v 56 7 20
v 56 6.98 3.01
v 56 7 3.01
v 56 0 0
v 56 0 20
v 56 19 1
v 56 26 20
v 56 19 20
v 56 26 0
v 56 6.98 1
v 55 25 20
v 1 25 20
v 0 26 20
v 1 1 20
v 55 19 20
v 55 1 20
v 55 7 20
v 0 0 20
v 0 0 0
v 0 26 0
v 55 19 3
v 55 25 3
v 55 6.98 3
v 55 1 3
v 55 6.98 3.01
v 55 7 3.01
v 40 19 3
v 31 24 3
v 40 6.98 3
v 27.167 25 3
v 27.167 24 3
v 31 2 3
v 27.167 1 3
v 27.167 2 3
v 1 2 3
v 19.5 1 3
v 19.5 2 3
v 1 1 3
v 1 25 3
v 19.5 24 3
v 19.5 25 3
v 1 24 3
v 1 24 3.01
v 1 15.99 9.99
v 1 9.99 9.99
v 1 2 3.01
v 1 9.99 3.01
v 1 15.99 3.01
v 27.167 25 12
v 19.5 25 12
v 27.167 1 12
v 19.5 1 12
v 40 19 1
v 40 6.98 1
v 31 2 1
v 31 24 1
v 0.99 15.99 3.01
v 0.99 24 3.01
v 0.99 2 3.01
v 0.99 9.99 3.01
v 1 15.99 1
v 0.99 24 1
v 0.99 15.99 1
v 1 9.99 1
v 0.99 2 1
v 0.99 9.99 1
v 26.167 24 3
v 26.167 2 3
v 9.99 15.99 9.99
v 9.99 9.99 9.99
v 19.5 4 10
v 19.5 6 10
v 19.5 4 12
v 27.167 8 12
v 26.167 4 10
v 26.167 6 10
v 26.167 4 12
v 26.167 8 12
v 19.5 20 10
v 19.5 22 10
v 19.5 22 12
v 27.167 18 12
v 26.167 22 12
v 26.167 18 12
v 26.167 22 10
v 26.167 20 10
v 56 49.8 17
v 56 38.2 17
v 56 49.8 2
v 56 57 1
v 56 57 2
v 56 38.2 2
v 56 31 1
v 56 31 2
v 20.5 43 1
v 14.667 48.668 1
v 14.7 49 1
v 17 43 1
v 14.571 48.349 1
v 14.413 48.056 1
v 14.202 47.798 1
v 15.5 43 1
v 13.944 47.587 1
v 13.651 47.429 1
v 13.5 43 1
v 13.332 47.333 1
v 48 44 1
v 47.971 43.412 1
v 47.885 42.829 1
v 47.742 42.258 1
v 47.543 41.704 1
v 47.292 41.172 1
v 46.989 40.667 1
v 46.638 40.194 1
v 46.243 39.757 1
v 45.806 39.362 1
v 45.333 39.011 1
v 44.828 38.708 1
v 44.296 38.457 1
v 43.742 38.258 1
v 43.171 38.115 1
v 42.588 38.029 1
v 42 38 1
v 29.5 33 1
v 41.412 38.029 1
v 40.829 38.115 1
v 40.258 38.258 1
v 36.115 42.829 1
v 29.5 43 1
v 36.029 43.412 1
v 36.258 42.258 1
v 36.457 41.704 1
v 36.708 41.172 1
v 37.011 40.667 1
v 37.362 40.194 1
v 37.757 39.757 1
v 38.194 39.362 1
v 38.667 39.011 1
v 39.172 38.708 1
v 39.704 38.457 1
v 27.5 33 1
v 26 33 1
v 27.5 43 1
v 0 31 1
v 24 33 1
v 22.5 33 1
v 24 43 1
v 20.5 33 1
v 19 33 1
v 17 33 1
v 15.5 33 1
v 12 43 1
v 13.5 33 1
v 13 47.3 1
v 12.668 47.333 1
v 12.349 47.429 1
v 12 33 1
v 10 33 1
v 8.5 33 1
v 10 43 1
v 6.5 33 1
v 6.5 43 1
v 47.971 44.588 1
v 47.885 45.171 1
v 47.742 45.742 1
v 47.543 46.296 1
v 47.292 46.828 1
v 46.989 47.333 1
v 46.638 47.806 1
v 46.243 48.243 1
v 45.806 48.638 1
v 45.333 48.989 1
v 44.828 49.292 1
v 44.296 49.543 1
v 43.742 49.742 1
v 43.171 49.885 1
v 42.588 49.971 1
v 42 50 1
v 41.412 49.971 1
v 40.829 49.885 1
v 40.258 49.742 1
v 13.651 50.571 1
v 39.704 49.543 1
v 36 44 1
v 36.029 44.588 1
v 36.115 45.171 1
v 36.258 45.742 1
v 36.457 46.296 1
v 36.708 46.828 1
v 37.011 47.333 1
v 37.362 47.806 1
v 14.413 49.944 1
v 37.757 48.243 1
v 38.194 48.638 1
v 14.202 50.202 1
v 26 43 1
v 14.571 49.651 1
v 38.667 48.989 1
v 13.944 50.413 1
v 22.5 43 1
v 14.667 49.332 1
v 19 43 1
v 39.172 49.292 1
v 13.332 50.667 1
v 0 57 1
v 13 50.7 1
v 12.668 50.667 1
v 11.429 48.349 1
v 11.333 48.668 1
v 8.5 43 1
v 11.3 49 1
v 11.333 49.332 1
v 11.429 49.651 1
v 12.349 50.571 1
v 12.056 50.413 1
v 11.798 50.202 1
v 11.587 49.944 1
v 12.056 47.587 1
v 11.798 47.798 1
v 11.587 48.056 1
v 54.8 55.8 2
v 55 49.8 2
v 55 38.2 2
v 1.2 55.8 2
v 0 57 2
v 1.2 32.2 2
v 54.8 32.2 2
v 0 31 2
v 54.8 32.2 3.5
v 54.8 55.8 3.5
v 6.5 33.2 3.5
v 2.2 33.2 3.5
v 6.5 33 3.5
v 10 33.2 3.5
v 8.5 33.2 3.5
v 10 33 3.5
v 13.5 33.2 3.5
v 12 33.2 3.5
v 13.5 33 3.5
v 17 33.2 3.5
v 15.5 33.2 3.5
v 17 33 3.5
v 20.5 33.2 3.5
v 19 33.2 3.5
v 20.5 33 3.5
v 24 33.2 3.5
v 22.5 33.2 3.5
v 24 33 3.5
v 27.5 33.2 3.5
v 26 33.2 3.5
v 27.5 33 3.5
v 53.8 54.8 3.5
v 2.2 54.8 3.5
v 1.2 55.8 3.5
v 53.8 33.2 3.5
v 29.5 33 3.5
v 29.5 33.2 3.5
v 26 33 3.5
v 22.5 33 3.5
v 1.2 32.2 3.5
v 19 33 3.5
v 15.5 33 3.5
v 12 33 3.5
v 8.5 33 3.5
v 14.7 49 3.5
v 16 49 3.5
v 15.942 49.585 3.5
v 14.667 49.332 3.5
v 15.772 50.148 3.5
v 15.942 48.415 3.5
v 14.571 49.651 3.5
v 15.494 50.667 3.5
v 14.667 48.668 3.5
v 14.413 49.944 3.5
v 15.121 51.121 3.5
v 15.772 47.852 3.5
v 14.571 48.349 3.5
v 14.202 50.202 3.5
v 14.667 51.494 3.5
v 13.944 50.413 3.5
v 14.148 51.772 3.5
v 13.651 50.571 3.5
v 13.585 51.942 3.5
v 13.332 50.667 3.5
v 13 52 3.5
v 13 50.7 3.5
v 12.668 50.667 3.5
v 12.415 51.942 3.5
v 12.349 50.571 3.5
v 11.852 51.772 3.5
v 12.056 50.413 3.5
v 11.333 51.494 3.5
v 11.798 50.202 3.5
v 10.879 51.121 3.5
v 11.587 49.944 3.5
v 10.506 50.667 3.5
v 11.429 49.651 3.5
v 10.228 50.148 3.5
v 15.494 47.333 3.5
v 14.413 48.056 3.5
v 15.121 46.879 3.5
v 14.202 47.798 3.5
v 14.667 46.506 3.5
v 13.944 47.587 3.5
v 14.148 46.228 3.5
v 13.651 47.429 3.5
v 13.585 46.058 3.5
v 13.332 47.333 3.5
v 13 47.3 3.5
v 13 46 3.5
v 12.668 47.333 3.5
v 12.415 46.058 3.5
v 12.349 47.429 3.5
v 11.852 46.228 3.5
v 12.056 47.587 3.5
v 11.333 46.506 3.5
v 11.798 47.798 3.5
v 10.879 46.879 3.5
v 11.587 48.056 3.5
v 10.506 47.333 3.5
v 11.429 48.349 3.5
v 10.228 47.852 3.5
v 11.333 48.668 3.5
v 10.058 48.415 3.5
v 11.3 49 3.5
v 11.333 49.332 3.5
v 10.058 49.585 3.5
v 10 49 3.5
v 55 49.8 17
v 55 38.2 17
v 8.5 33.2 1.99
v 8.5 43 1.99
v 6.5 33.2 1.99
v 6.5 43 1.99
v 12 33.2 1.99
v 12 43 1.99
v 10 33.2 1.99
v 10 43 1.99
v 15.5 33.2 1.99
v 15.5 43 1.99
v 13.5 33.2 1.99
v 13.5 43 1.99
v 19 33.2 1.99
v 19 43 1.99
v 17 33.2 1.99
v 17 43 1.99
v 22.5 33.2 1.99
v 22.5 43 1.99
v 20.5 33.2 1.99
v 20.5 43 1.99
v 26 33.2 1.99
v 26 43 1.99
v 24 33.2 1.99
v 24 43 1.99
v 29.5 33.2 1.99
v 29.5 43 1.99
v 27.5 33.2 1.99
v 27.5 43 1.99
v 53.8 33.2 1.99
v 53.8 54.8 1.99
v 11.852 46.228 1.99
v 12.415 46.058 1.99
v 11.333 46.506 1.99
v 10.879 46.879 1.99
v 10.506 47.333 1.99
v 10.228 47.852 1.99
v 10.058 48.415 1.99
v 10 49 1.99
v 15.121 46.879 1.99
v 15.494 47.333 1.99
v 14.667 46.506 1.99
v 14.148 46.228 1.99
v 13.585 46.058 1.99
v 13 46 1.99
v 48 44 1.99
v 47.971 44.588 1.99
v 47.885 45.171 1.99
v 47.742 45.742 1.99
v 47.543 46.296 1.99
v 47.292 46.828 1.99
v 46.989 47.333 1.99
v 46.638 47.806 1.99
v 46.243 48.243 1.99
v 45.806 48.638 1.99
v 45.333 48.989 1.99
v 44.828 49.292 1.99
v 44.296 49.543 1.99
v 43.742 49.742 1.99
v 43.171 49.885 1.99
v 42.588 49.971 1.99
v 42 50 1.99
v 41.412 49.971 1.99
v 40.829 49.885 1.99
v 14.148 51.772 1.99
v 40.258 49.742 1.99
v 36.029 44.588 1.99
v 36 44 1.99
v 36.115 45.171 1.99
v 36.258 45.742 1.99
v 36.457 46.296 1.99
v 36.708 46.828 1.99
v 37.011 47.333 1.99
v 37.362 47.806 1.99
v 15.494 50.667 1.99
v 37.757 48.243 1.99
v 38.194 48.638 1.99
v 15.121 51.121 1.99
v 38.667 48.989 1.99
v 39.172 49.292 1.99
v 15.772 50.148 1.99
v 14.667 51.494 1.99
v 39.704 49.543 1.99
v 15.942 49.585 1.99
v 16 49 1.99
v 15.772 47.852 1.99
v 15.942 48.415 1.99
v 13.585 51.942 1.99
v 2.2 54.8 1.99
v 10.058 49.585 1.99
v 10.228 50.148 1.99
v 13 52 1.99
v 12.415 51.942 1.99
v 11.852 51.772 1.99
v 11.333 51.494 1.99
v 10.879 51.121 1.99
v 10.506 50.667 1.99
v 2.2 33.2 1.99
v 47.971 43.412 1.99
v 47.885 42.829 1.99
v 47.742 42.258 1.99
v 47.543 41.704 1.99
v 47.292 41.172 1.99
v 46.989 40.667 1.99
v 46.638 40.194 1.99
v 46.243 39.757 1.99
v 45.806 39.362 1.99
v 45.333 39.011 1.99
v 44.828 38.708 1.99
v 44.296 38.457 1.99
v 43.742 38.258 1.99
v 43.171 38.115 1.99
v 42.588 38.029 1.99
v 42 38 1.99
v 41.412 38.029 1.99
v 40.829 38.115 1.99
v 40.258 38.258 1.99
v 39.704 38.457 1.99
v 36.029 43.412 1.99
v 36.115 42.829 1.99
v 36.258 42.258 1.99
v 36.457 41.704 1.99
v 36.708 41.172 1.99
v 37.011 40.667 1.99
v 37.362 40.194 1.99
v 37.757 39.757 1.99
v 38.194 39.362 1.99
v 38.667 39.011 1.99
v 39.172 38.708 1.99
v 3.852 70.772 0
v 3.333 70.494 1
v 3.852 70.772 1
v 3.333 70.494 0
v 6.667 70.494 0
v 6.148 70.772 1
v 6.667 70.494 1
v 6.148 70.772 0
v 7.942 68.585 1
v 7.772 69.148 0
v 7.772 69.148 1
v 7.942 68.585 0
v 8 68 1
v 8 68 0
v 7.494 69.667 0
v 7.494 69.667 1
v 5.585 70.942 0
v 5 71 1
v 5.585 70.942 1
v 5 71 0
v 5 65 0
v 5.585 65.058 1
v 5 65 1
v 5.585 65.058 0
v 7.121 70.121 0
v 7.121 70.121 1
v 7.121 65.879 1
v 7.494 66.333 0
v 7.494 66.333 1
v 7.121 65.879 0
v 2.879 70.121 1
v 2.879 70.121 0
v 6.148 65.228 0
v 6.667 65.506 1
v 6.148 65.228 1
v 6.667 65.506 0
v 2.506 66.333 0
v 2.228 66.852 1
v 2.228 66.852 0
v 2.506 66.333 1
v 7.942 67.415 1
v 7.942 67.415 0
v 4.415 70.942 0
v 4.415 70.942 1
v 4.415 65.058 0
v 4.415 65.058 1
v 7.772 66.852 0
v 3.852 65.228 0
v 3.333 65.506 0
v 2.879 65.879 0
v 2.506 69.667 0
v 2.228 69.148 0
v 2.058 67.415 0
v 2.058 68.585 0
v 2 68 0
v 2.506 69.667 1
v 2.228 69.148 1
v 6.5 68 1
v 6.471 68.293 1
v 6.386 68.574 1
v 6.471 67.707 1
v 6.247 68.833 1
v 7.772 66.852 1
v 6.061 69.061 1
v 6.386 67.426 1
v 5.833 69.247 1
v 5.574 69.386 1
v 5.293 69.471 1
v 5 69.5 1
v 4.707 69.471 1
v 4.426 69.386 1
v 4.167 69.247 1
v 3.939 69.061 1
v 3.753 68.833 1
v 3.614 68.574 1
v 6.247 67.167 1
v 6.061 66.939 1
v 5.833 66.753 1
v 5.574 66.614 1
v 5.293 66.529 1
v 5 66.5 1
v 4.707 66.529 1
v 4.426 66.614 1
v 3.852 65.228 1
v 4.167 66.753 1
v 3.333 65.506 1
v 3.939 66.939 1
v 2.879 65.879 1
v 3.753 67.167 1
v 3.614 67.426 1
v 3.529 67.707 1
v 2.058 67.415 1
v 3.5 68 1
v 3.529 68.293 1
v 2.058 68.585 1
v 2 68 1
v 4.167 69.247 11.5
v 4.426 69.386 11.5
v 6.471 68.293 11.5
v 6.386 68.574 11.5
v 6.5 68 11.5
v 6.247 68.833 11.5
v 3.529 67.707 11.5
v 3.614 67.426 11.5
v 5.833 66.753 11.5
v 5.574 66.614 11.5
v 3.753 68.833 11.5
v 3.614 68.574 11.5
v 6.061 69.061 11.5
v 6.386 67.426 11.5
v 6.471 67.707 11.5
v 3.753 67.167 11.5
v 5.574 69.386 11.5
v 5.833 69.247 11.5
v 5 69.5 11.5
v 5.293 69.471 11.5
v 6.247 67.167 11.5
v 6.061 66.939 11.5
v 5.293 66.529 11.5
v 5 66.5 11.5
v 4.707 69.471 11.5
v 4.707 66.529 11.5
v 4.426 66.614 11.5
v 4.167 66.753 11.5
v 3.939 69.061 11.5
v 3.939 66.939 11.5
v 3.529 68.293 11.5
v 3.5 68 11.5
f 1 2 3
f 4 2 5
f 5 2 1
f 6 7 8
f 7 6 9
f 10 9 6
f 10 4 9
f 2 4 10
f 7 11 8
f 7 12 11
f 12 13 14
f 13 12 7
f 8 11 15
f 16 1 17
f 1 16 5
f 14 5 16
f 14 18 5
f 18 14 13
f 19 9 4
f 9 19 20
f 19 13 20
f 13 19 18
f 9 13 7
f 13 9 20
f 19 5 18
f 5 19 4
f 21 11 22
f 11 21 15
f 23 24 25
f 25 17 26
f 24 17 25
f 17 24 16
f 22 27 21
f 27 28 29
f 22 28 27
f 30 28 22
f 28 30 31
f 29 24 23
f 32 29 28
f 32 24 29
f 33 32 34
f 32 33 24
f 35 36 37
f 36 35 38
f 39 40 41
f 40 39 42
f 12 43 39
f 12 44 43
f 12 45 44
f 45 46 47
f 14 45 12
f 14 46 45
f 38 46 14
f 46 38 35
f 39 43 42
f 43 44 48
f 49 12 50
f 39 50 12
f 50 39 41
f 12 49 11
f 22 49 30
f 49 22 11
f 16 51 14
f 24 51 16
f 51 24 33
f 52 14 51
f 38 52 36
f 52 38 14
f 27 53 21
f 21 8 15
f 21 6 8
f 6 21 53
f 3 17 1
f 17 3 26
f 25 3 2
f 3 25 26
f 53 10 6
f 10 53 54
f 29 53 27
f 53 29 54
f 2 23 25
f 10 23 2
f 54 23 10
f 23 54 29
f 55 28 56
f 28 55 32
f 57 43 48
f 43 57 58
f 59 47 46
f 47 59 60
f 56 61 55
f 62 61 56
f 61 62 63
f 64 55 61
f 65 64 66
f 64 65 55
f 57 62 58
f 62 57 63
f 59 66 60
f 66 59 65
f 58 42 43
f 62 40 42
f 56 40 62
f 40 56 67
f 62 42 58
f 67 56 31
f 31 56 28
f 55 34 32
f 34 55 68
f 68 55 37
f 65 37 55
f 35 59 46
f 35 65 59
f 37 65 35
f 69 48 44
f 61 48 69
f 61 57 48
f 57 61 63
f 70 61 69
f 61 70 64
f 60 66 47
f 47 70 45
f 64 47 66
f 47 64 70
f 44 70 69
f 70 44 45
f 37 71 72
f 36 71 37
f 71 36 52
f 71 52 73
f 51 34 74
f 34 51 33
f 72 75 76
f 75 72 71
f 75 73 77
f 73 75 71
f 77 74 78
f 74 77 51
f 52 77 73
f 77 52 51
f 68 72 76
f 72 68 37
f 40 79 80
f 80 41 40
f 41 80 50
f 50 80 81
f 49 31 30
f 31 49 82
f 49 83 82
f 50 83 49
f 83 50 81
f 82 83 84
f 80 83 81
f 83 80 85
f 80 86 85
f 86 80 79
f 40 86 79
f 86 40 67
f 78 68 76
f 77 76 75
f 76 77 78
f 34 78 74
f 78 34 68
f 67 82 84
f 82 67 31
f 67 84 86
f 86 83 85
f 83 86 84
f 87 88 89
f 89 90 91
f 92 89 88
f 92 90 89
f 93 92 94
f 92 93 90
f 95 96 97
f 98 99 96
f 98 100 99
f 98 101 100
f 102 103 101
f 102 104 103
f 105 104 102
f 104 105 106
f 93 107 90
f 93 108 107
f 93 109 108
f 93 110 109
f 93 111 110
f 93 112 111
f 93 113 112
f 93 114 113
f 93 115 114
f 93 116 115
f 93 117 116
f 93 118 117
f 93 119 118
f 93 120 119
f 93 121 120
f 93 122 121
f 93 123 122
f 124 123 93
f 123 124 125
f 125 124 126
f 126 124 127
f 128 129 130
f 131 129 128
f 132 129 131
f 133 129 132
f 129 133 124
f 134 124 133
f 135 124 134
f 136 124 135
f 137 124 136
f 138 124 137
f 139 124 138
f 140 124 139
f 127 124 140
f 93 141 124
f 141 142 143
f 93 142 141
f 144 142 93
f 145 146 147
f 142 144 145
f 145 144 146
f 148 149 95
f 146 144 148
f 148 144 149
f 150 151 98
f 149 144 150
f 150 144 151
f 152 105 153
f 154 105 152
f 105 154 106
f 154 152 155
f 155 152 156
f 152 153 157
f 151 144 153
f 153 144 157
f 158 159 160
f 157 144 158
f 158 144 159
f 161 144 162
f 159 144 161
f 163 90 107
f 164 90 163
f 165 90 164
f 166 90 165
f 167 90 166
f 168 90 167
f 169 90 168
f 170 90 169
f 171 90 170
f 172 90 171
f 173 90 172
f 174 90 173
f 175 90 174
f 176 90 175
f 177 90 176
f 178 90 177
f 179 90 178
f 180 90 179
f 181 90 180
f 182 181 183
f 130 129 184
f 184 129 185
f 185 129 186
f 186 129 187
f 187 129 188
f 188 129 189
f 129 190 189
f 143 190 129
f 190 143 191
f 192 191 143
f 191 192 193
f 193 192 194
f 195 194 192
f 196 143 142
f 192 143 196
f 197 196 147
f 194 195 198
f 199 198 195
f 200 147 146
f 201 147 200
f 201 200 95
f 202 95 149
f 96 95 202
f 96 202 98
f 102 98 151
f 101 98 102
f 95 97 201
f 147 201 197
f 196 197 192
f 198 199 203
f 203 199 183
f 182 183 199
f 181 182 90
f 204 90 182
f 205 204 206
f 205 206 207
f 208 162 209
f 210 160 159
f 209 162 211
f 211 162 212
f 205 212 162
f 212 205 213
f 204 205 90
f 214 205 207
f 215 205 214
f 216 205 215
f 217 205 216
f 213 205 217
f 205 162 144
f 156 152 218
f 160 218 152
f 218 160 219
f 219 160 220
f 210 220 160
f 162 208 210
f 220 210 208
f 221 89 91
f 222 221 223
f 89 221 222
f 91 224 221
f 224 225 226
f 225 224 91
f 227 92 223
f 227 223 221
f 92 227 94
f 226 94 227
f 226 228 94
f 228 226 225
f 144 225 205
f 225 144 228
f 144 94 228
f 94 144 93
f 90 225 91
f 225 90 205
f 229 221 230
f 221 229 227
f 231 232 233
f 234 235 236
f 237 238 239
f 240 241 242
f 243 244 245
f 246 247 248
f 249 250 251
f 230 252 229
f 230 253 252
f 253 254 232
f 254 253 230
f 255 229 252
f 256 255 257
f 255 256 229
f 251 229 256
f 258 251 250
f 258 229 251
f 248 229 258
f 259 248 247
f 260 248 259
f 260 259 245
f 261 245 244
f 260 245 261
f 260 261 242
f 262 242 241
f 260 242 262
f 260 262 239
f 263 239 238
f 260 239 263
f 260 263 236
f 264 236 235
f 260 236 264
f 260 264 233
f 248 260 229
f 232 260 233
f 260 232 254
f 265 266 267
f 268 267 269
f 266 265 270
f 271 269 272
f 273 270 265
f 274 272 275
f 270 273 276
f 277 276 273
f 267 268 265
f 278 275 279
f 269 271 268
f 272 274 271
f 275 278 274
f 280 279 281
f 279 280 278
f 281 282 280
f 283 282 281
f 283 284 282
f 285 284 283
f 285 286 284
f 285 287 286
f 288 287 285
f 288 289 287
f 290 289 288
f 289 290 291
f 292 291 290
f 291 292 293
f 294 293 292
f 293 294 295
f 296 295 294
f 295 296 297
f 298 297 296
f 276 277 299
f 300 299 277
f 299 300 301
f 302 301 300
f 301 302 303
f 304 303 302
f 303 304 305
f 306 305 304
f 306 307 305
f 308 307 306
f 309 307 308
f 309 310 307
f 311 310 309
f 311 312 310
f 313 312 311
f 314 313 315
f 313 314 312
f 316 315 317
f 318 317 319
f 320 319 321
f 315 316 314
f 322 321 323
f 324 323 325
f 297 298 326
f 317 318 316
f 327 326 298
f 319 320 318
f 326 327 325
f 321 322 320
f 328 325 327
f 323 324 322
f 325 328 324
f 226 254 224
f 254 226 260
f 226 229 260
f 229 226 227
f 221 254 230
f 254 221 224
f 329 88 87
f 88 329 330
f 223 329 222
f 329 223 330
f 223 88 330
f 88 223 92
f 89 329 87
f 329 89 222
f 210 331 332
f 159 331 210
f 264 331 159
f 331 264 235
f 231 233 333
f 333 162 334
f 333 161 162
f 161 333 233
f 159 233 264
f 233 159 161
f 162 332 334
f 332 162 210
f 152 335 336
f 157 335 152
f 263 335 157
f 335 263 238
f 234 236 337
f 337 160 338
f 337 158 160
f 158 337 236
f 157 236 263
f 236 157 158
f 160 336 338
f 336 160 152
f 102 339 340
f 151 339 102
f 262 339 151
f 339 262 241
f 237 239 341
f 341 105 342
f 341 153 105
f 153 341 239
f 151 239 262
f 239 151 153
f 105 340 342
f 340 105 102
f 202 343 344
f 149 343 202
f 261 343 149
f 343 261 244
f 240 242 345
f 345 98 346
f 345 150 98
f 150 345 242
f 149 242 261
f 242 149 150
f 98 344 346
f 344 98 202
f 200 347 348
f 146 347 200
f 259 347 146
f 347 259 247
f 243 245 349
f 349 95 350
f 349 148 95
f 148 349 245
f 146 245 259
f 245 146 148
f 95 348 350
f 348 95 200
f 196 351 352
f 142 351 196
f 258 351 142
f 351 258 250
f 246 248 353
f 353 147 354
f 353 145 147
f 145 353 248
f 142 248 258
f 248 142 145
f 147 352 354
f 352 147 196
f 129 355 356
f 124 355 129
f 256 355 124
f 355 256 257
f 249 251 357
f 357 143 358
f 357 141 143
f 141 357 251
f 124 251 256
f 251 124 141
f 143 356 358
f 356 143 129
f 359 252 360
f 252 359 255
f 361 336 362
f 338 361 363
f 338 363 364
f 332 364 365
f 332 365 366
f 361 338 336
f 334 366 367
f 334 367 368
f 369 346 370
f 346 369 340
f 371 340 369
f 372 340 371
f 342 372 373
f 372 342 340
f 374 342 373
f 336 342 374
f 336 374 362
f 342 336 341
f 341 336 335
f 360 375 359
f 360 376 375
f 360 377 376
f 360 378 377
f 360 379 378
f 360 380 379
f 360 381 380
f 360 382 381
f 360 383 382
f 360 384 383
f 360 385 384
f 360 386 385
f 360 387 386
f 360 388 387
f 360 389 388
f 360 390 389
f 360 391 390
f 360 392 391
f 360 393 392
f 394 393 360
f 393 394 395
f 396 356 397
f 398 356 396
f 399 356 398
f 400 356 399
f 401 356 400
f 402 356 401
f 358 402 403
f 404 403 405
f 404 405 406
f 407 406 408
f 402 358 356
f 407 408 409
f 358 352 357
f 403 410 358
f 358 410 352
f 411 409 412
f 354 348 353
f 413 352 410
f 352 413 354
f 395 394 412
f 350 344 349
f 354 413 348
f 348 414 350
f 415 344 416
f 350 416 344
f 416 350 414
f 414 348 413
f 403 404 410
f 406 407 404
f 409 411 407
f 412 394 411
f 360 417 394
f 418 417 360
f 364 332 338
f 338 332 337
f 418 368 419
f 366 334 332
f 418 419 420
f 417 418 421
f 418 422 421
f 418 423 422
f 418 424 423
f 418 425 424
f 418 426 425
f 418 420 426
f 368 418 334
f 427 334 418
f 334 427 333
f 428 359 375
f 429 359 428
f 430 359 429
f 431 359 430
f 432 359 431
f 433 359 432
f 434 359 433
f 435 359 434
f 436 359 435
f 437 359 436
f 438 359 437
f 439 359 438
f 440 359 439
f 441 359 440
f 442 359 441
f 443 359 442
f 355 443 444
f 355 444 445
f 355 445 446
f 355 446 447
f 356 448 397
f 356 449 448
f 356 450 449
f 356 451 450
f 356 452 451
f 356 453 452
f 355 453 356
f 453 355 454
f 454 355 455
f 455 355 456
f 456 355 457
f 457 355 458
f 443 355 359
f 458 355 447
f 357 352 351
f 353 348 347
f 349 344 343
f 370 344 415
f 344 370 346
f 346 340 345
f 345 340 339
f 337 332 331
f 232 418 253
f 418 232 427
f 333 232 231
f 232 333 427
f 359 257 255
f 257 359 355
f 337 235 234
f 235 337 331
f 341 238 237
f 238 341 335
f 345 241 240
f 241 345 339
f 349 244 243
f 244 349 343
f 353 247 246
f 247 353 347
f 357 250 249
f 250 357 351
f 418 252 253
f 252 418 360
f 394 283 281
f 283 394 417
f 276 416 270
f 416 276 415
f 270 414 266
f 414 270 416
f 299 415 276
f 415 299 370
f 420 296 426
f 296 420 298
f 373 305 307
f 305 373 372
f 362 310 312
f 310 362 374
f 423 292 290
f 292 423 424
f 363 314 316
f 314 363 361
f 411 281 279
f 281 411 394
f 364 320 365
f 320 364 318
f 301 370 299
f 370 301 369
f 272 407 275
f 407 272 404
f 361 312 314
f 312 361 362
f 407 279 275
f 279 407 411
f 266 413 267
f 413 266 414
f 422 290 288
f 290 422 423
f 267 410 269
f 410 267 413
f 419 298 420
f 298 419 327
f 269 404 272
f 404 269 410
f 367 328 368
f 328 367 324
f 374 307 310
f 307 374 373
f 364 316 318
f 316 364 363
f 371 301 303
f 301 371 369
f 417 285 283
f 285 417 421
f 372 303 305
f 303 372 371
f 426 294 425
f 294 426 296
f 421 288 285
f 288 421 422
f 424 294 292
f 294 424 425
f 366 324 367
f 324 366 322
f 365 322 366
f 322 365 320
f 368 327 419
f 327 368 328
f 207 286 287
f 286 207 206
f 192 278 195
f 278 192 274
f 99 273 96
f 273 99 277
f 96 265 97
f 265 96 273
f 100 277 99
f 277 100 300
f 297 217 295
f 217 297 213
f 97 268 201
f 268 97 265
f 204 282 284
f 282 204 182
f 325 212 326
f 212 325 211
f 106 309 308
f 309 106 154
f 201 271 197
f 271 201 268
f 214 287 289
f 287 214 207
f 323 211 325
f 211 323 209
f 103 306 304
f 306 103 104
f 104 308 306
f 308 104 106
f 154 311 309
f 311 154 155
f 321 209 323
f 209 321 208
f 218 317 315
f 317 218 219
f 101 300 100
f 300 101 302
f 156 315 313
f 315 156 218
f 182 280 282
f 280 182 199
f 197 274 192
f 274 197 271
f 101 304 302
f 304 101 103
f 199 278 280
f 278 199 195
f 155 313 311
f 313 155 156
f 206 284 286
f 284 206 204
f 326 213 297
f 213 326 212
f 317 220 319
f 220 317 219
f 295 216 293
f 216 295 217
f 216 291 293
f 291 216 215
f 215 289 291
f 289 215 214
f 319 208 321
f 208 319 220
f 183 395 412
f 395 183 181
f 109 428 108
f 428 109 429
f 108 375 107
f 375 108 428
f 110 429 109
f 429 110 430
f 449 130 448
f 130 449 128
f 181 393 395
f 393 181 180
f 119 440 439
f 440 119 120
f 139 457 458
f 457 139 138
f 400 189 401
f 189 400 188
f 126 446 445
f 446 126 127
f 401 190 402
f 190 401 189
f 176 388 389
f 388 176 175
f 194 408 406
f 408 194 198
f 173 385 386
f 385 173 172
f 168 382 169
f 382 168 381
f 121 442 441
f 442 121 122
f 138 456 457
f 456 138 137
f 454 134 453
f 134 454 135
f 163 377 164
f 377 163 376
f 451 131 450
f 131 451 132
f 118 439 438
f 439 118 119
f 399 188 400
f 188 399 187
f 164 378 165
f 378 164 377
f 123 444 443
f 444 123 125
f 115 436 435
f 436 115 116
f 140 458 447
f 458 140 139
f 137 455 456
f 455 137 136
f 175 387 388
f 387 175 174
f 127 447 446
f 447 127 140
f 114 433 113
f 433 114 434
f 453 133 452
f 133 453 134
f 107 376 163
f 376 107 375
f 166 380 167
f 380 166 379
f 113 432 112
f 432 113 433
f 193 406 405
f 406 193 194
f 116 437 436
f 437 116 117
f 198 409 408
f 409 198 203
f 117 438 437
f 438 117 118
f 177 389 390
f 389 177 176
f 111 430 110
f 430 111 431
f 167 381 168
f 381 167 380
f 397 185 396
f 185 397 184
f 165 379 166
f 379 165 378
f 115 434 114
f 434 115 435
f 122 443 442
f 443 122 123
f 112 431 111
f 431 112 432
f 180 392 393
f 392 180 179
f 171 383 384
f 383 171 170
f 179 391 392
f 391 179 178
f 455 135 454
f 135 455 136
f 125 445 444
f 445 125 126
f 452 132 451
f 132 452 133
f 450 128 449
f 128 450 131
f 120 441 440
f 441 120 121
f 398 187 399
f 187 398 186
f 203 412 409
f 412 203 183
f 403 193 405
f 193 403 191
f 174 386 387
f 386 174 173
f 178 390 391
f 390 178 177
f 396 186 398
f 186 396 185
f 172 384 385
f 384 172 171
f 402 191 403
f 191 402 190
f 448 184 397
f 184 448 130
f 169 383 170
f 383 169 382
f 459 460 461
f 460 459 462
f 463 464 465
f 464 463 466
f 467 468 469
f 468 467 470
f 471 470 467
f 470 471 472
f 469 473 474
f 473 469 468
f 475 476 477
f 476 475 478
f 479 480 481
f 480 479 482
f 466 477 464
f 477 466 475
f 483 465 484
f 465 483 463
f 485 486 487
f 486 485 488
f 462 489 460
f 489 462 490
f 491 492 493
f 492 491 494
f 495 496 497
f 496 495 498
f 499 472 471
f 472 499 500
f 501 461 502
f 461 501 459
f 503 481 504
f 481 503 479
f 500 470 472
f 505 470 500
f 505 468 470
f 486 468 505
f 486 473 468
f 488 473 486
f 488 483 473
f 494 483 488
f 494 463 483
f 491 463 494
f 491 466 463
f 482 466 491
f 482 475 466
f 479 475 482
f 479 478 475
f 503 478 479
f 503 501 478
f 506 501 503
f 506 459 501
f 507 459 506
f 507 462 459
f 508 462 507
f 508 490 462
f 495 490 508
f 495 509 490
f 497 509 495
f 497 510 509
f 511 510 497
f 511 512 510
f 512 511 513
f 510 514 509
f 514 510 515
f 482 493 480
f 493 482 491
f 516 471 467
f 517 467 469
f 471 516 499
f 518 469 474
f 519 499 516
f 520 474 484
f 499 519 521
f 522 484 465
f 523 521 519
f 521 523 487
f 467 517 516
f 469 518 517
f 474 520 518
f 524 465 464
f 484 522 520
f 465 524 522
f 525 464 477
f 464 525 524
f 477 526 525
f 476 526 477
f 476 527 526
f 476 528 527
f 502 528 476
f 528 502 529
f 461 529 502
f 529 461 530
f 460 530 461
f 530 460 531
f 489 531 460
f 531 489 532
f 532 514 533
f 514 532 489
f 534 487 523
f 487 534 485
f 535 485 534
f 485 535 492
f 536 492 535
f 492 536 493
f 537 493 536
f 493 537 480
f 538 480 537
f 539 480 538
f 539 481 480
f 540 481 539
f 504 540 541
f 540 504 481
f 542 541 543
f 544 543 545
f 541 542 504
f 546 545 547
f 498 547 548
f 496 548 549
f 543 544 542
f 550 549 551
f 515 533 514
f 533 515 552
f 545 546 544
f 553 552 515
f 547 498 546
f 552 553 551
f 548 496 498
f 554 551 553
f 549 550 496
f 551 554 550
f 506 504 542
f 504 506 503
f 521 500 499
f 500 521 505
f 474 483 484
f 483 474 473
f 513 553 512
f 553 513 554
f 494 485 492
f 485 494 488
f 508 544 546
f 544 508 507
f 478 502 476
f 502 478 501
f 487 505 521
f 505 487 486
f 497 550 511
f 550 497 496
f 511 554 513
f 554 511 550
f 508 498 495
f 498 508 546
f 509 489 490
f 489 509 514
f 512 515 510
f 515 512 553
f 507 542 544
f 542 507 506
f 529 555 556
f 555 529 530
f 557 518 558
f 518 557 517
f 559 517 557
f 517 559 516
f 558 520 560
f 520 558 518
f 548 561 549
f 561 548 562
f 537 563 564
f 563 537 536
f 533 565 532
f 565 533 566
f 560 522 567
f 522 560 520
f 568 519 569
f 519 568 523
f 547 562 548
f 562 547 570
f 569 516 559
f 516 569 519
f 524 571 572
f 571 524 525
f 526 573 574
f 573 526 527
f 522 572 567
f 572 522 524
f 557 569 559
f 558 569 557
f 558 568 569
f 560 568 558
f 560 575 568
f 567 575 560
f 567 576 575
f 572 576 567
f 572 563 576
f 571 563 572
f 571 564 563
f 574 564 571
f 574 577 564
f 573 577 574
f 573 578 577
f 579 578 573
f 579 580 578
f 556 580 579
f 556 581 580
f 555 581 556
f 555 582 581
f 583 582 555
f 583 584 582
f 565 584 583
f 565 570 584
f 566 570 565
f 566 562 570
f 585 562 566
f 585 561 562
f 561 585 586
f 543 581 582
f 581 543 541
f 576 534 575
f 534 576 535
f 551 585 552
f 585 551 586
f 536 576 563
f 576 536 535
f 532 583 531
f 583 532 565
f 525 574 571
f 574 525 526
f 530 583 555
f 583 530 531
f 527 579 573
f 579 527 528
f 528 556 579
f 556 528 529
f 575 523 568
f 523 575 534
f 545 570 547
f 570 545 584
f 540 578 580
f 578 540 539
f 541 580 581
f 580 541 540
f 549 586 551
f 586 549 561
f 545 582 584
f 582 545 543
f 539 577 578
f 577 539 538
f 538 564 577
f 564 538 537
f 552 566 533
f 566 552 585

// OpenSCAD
// Basic parametric box enclosure
// Units are millimeters (OpenSCAD convention)

// --- Parameters ---
esp_long_axis = 23;
esp_short_axis = 18;
wall    = 1;    // wall thickness
usb_body_len    = 21;  // how far the connector body extends inward from the +X wall

outer_x = esp_short_axis + 2*wall + usb_body_len + 15;
outer_y = esp_short_axis + 2*wall + 6;
outer_z = 20;   // box height
floor_thickness = 3;  // thicker than wall so the USB recess doesn't punch through
lid_gap = 0.2;  // clearance between box and lid (per side)

// USB cutout (on the +X wall, centered on Y)
usb_w = 12;     // aperture width
usb_h = 2;      // aperture height
usb_z = floor_thickness;  // slot bottom sits flush with inner floor surface

// USB connector body recess in the floor (pocket the connector body drops into)
usb_body_recess = 2;   // pocket depth (must be < floor_thickness or it punches through)

// Battery floor recess (opposite side from USB, below the esp holder)
battery_x = 30;        // length along X
battery_y = 22;        // width along Y
battery_recess = 2;    // pocket depth (must be < floor_thickness)


esp_pcb_raise       = 7;   // how far above the floor the PCB sits (= shelf height)

// Lid lip — perimeter frame nests inside the box walls; middle is hollow
// to save material and add interior headroom.
lip_h       = 1.5;
lip_frame_w = 1;   // width of the perimeter frame

// Button plunger — captive in the lid, presses the PCB's on-board button.
// Plunger is printed separately and drops into the lid hole from inside
// before the lid is assembled. The flange is wider than the hole, so it
// stays captive even when the box is held upside down.
button_x              = wall + 2 + 10;  // 10mm in X from the PCB origin
button_y              = wall + 3 + 4;   //  4mm in Y from the PCB origin
button_top_z          = 12;             // height of the real button's top above the box floor
plunger_shaft_d       = 3;
plunger_flange_d      = 6;
plunger_flange_h      = 1;
plunger_top_above_lid = 8;              // shaft pokes this far above the lid for finger-press
plunger_hole_d        = plunger_shaft_d + 0.4;  // shaft + clearance
plunger_pad_d         = plunger_flange_d + .0;   // lip pad around the hole that keeps the flange seated

// Center hole — through the lid in the -Y half (opposite the gills).
lid_hole_d = 12;
lid_hole_x = 3 * outer_x / 4;
lid_hole_y = outer_y / 2;

// Gills — vertical slots in the +Y half of the lid (opposite the plunger),
// cut through the lid plate and the lip so the on-board LED shines through.
gill_count = 7;
gill_w     = 2;                                                // slot width along X
gill_pitch = 3.5;                                                // X spacing between slot centers
gill_y_lo  = outer_y / 2 + 1 ;                                  // start past the lid Y midline
gill_y_hi  = outer_y - wall - 1;                               // end just inside the +Y wall
gill_x_lo  = (outer_x - ((gill_count - 1) * gill_pitch + gill_w)) / 2 - 10;

// Visibility toggles — flip to false to hide a component in preview
show_box         = true;
show_esp_holder  = true;
show_lid         = true;
show_assembled = false;  // when true, lid is offset for preview
show_pcbs = false;

// --- Box (open-top) ---
module box() {
    difference() {
        cube([outer_x, outer_y, outer_z]);
        // hollow interior, floor is `floor_thickness` thick
        translate([wall, wall, floor_thickness])
            cube([outer_x - 2*wall,
                  outer_y - 2*wall,
                  outer_z]); // cut all the way through the top

        // USB cutout through the +X wall, open all the way to the top of the box
        // (top of the aperture is closed by a tab on the lid)
        translate([outer_x - wall - 0.01,
                   (outer_y - usb_w) / 2,
                   usb_z])
            cube([wall + 0.02, usb_w, outer_z - usb_z + 0.01]);

        // Floor recess (pocket) for the USB connector body
        // Goes from the inner floor surface down by usb_body_recess
        translate([outer_x - usb_body_len + 5, // +5 => offset the X dimension to create a small division between batter pocket and USB pocket
                   (outer_y - usb_w) / 2 - 0.02,
                   floor_thickness - usb_body_recess])
            cube([usb_body_len + 0.02, usb_w + 0.02, usb_body_recess + 0.01]);

        // Battery floor recess on the -X side, centered on Y
        translate([wall - 0.01,
                   (outer_y - battery_y) / 2,
                   floor_thickness - battery_recess])
            cube([battery_x + 0.01, battery_y, battery_recess + 0.01]);
    }
}

// --- Lid (sits on top, with a lip that drops into the box) ---
module lid() {
    lip_x = outer_x - 2*wall - 2*lid_gap;
    lip_y = outer_y - 2*wall - 2*lid_gap;

    // height of the USB tab — fills the open part of the box's USB slot,
    // so the tab's underside becomes the top of the USB aperture
    usb_tab_h = outer_z - (usb_z + usb_h);

    difference() {
        union() {
            // flat top plate
            //%color([.8,.8,.2,.2])
            cube([outer_x, outer_y, wall]);
            // lip underneath that nests inside the box walls
            //%color([.8,.8,.2,.2])
            translate([wall + lid_gap, wall + lid_gap, -lip_h])
                cube([lip_x, lip_y, lip_h]);
            // USB tab — drops into the open-top slot in the +X wall
            translate([outer_x - wall,
                       (outer_y - usb_w) / 2 + lid_gap,
                       -usb_tab_h])
                cube([wall, usb_w - 2*lid_gap, usb_tab_h]);
        }
        // Plunger hole (through the lid plate and the lip below it)
        translate([button_x, button_y, -lip_h - 0.01])
            cylinder(d=plunger_hole_d, h=wall + lip_h + 0.02, $fn=32);

        // Center hole through the -Y half of the lid (opposite the gills)
        translate([lid_hole_x, lid_hole_y, -lip_h - 0.01])
            cylinder(d=lid_hole_d, h=wall + lip_h + 0.02, $fn=64);

        // Gills — let the on-board LED shine through the +Y half of the lid
        for (i = [0 : gill_count - 1])
            translate([gill_x_lo + i * gill_pitch, gill_y_lo, -lip_h - 0.01])
                cube([gill_w, gill_y_hi - gill_y_lo, wall + lip_h + 0.02]);

        // Hollow out the middle of the lip — keep a perimeter frame plus
        // a pad around the plunger hole so the flange still seats on lip.
        difference() {
            translate([wall + lid_gap + lip_frame_w,
                       wall + lid_gap + lip_frame_w,
                       -lip_h - 0.01])
                cube([lip_x - 2*lip_frame_w,
                      lip_y - 2*lip_frame_w,
                      lip_h + 0.02]);
            translate([button_x, button_y, -lip_h - 0.02])
                cylinder(d=plunger_pad_d, h=lip_h + 0.04, $fn=32);
        }
    }
}

// --- Plunger (separate part, captive in the lid hole) ---
module plunger() {
    $fn = 32;
    // Flange sits inside the box, under the lid lip — wider than the hole
    // so the plunger can't fall out when the device is inverted.
    cylinder(d=plunger_flange_d, h=plunger_flange_h);
    // Shaft runs from the flange up through the lip, the plate, and
    // pokes out the top by `plunger_top_above_lid` for finger-pressing.
    cylinder(d=plunger_shaft_d,
             h=plunger_flange_h + lip_h + wall + plunger_top_above_lid);
}

// -- Build a smaller holder for the ESP, with some room for connections below
module esp_holder() {
    support_l       = 6;
    tower_above_pcb = 2;   // tower extends this far above the shelf, alongside the PCB

    // Support wedge — knife edge at the floor (leaves the battery recess
    // clear), widens up to the PCB. Slope is 45° from the wall, which is
    // the steepest overhang most printers handle without supports.
    sup_z_bot = floor_thickness - battery_recess;
    sup_z_top = floor_thickness + esp_pcb_raise;
    support_w = sup_z_top - sup_z_bot;  // 45° overhang cap

    // -.01 to force wedge to merge with the box
    translate([0 - .01,
               wall + 3 + esp_short_axis/2 + support_l/2 -.01,
               0 - .01])
    rotate([90, 0, 0])
    linear_extrude(support_l)
        polygon([
            [wall,              sup_z_bot],
            [wall,              sup_z_top],
            [wall + support_w,  sup_z_top]
        ]);


    // Side retainers on the long edges of the PCB (Y sides).
    // Each is an L sitting on the floor: wide base on the floor strip
    // outside the battery recess, 45° ramp up to a shelf at PCB level
    // (PCB drops onto the shelf — vertical support), then a tower
    // alongside the PCB above the shelf (lateral support).
    z_bot       = floor_thickness;
    z_shelf     = z_bot + esp_pcb_raise;                // PCB rests on top of the shelf
    z_top       = z_shelf + tower_above_pcb;        // top of the tower
    base_y_in   = (outer_y - battery_y) / 2;        // battery recess edge (where the base ends)
    stopper_y_adj = 3;  // This adjusts how much the stopper and retainer project from the walls. A bigger adjustment means less projection and gentler slope => battery has more space
    slope_y_top = base_y_in + esp_pcb_raise-stopper_y_adj;            // 45° ramp rises esp_pcb_raise in y too
    pcb_y_edge  = wall + 3;                          // tower's inner edge (PCB's -Y edge)
    retainer_x   = wall + 7 + esp_long_axis/2;
    retainer_len = esp_long_axis/3;

    // -Y retainer
    translate([retainer_x, 0, 0])
    rotate([90, 0, 90])
    linear_extrude(retainer_len)
        polygon([
            [wall,        z_bot],         // base outer (at wall)
            [base_y_in,   z_bot],         // base inner (battery recess edge)
            [slope_y_top, z_shelf],       // top of 45° ramp = outer edge of shelf
            [pcb_y_edge,  z_shelf],       // shelf inner = tower outer (PCB rests here)
            [pcb_y_edge,  z_top],         // top of tower (PCB side)
            [wall,        z_top]          // top of tower (wall side)
        ]);

    // +Y retainer (mirror)
    translate([retainer_x, 0, 0])
    rotate([90, 0, 90])
    linear_extrude(retainer_len)
        polygon([
            [outer_y - wall,        z_bot],
            [outer_y - base_y_in,   z_bot],
            [outer_y - slope_y_top, z_shelf],
            [outer_y - pcb_y_edge,  z_shelf],
            [outer_y - pcb_y_edge,  z_top],
            [outer_y - wall,        z_top]
        ]);

    // X-stopper at the +X end of each retainer: replace the L's last
    // `stopper_len` with a solid wedge (45° ramp continues all the way
    // to z_top, no shelf notch). The wedge intrudes into the PCB area
    // above the shelf, so the PCB butts up against it and can't slide
    // along X.
    stopper_len  = 1;
    stopper_apex = base_y_in + (z_top - z_bot)-stopper_y_adj;   // 45° ramp's y at z_top

    // -Y stopper
    translate([retainer_x + retainer_len - stopper_len, 0, 0])
    rotate([90, 0, 90])
    linear_extrude(stopper_len)
        polygon([
            [wall,         z_bot],
            [base_y_in,    z_bot],
            [stopper_apex, z_top],
            [wall,         z_top]
        ]);

    // +Y stopper (mirror)
    translate([retainer_x + retainer_len - stopper_len, 0, 0])
    rotate([90, 0, 90])
    linear_extrude(stopper_len)
        polygon([
            [outer_y - wall,         z_bot],
            [outer_y - base_y_in,    z_bot],
            [outer_y - stopper_apex, z_top],
            [outer_y - wall,         z_top]
        ]);
}

module pcbs() {
    // ESP PCB (representation), raised by the support
    %color([.0,.6,.8,.3])
    %translate([wall+2, wall+3, floor_thickness + esp_pcb_raise])
        cube([esp_long_axis, esp_short_axis, 5]);

    // Battery (representation) — 19×26×4mm, rotated so the 26mm side
    // runs along X to fit the 30×20 floor recess. Bottom sits in the
    // recess; the 4mm battery sticks up 2mm past the floor surface.
    %color([.7,.5,.1,.3])
    %translate([wall + 2, (outer_y - 19)/2, floor_thickness - battery_recess])
        cube([26, 19, 4]);

    // USB PCB (representation) — 30×12×3mm. Sits in the floor recess
    // channel that cuts through the +X wall; the +X end protrudes 5mm
    // past the box for the connector to plug into.
    %color([.2,.2,.8,.3])
    %translate([outer_x - 16, (outer_y - usb_w)/2, floor_thickness - usb_body_recess])
        cube([30, usb_w, 3]);
}

// --- Render ---

if (show_box) {
    union() {
        box();
        esp_holder();
    }
}

if (show_lid) {
    if (show_assembled) {
        translate([0, 0, outer_z]) lid(); 
        translate([button_x, button_y, button_top_z]) plunger();
    } else {
        translate([0, 2*outer_y + 5, 2]) rotate([180, 0, 0]) lid();
        translate([5, 3*outer_y - 10, 0]) plunger();
    }
}

if (show_pcbs) {
    pcbs();
}
